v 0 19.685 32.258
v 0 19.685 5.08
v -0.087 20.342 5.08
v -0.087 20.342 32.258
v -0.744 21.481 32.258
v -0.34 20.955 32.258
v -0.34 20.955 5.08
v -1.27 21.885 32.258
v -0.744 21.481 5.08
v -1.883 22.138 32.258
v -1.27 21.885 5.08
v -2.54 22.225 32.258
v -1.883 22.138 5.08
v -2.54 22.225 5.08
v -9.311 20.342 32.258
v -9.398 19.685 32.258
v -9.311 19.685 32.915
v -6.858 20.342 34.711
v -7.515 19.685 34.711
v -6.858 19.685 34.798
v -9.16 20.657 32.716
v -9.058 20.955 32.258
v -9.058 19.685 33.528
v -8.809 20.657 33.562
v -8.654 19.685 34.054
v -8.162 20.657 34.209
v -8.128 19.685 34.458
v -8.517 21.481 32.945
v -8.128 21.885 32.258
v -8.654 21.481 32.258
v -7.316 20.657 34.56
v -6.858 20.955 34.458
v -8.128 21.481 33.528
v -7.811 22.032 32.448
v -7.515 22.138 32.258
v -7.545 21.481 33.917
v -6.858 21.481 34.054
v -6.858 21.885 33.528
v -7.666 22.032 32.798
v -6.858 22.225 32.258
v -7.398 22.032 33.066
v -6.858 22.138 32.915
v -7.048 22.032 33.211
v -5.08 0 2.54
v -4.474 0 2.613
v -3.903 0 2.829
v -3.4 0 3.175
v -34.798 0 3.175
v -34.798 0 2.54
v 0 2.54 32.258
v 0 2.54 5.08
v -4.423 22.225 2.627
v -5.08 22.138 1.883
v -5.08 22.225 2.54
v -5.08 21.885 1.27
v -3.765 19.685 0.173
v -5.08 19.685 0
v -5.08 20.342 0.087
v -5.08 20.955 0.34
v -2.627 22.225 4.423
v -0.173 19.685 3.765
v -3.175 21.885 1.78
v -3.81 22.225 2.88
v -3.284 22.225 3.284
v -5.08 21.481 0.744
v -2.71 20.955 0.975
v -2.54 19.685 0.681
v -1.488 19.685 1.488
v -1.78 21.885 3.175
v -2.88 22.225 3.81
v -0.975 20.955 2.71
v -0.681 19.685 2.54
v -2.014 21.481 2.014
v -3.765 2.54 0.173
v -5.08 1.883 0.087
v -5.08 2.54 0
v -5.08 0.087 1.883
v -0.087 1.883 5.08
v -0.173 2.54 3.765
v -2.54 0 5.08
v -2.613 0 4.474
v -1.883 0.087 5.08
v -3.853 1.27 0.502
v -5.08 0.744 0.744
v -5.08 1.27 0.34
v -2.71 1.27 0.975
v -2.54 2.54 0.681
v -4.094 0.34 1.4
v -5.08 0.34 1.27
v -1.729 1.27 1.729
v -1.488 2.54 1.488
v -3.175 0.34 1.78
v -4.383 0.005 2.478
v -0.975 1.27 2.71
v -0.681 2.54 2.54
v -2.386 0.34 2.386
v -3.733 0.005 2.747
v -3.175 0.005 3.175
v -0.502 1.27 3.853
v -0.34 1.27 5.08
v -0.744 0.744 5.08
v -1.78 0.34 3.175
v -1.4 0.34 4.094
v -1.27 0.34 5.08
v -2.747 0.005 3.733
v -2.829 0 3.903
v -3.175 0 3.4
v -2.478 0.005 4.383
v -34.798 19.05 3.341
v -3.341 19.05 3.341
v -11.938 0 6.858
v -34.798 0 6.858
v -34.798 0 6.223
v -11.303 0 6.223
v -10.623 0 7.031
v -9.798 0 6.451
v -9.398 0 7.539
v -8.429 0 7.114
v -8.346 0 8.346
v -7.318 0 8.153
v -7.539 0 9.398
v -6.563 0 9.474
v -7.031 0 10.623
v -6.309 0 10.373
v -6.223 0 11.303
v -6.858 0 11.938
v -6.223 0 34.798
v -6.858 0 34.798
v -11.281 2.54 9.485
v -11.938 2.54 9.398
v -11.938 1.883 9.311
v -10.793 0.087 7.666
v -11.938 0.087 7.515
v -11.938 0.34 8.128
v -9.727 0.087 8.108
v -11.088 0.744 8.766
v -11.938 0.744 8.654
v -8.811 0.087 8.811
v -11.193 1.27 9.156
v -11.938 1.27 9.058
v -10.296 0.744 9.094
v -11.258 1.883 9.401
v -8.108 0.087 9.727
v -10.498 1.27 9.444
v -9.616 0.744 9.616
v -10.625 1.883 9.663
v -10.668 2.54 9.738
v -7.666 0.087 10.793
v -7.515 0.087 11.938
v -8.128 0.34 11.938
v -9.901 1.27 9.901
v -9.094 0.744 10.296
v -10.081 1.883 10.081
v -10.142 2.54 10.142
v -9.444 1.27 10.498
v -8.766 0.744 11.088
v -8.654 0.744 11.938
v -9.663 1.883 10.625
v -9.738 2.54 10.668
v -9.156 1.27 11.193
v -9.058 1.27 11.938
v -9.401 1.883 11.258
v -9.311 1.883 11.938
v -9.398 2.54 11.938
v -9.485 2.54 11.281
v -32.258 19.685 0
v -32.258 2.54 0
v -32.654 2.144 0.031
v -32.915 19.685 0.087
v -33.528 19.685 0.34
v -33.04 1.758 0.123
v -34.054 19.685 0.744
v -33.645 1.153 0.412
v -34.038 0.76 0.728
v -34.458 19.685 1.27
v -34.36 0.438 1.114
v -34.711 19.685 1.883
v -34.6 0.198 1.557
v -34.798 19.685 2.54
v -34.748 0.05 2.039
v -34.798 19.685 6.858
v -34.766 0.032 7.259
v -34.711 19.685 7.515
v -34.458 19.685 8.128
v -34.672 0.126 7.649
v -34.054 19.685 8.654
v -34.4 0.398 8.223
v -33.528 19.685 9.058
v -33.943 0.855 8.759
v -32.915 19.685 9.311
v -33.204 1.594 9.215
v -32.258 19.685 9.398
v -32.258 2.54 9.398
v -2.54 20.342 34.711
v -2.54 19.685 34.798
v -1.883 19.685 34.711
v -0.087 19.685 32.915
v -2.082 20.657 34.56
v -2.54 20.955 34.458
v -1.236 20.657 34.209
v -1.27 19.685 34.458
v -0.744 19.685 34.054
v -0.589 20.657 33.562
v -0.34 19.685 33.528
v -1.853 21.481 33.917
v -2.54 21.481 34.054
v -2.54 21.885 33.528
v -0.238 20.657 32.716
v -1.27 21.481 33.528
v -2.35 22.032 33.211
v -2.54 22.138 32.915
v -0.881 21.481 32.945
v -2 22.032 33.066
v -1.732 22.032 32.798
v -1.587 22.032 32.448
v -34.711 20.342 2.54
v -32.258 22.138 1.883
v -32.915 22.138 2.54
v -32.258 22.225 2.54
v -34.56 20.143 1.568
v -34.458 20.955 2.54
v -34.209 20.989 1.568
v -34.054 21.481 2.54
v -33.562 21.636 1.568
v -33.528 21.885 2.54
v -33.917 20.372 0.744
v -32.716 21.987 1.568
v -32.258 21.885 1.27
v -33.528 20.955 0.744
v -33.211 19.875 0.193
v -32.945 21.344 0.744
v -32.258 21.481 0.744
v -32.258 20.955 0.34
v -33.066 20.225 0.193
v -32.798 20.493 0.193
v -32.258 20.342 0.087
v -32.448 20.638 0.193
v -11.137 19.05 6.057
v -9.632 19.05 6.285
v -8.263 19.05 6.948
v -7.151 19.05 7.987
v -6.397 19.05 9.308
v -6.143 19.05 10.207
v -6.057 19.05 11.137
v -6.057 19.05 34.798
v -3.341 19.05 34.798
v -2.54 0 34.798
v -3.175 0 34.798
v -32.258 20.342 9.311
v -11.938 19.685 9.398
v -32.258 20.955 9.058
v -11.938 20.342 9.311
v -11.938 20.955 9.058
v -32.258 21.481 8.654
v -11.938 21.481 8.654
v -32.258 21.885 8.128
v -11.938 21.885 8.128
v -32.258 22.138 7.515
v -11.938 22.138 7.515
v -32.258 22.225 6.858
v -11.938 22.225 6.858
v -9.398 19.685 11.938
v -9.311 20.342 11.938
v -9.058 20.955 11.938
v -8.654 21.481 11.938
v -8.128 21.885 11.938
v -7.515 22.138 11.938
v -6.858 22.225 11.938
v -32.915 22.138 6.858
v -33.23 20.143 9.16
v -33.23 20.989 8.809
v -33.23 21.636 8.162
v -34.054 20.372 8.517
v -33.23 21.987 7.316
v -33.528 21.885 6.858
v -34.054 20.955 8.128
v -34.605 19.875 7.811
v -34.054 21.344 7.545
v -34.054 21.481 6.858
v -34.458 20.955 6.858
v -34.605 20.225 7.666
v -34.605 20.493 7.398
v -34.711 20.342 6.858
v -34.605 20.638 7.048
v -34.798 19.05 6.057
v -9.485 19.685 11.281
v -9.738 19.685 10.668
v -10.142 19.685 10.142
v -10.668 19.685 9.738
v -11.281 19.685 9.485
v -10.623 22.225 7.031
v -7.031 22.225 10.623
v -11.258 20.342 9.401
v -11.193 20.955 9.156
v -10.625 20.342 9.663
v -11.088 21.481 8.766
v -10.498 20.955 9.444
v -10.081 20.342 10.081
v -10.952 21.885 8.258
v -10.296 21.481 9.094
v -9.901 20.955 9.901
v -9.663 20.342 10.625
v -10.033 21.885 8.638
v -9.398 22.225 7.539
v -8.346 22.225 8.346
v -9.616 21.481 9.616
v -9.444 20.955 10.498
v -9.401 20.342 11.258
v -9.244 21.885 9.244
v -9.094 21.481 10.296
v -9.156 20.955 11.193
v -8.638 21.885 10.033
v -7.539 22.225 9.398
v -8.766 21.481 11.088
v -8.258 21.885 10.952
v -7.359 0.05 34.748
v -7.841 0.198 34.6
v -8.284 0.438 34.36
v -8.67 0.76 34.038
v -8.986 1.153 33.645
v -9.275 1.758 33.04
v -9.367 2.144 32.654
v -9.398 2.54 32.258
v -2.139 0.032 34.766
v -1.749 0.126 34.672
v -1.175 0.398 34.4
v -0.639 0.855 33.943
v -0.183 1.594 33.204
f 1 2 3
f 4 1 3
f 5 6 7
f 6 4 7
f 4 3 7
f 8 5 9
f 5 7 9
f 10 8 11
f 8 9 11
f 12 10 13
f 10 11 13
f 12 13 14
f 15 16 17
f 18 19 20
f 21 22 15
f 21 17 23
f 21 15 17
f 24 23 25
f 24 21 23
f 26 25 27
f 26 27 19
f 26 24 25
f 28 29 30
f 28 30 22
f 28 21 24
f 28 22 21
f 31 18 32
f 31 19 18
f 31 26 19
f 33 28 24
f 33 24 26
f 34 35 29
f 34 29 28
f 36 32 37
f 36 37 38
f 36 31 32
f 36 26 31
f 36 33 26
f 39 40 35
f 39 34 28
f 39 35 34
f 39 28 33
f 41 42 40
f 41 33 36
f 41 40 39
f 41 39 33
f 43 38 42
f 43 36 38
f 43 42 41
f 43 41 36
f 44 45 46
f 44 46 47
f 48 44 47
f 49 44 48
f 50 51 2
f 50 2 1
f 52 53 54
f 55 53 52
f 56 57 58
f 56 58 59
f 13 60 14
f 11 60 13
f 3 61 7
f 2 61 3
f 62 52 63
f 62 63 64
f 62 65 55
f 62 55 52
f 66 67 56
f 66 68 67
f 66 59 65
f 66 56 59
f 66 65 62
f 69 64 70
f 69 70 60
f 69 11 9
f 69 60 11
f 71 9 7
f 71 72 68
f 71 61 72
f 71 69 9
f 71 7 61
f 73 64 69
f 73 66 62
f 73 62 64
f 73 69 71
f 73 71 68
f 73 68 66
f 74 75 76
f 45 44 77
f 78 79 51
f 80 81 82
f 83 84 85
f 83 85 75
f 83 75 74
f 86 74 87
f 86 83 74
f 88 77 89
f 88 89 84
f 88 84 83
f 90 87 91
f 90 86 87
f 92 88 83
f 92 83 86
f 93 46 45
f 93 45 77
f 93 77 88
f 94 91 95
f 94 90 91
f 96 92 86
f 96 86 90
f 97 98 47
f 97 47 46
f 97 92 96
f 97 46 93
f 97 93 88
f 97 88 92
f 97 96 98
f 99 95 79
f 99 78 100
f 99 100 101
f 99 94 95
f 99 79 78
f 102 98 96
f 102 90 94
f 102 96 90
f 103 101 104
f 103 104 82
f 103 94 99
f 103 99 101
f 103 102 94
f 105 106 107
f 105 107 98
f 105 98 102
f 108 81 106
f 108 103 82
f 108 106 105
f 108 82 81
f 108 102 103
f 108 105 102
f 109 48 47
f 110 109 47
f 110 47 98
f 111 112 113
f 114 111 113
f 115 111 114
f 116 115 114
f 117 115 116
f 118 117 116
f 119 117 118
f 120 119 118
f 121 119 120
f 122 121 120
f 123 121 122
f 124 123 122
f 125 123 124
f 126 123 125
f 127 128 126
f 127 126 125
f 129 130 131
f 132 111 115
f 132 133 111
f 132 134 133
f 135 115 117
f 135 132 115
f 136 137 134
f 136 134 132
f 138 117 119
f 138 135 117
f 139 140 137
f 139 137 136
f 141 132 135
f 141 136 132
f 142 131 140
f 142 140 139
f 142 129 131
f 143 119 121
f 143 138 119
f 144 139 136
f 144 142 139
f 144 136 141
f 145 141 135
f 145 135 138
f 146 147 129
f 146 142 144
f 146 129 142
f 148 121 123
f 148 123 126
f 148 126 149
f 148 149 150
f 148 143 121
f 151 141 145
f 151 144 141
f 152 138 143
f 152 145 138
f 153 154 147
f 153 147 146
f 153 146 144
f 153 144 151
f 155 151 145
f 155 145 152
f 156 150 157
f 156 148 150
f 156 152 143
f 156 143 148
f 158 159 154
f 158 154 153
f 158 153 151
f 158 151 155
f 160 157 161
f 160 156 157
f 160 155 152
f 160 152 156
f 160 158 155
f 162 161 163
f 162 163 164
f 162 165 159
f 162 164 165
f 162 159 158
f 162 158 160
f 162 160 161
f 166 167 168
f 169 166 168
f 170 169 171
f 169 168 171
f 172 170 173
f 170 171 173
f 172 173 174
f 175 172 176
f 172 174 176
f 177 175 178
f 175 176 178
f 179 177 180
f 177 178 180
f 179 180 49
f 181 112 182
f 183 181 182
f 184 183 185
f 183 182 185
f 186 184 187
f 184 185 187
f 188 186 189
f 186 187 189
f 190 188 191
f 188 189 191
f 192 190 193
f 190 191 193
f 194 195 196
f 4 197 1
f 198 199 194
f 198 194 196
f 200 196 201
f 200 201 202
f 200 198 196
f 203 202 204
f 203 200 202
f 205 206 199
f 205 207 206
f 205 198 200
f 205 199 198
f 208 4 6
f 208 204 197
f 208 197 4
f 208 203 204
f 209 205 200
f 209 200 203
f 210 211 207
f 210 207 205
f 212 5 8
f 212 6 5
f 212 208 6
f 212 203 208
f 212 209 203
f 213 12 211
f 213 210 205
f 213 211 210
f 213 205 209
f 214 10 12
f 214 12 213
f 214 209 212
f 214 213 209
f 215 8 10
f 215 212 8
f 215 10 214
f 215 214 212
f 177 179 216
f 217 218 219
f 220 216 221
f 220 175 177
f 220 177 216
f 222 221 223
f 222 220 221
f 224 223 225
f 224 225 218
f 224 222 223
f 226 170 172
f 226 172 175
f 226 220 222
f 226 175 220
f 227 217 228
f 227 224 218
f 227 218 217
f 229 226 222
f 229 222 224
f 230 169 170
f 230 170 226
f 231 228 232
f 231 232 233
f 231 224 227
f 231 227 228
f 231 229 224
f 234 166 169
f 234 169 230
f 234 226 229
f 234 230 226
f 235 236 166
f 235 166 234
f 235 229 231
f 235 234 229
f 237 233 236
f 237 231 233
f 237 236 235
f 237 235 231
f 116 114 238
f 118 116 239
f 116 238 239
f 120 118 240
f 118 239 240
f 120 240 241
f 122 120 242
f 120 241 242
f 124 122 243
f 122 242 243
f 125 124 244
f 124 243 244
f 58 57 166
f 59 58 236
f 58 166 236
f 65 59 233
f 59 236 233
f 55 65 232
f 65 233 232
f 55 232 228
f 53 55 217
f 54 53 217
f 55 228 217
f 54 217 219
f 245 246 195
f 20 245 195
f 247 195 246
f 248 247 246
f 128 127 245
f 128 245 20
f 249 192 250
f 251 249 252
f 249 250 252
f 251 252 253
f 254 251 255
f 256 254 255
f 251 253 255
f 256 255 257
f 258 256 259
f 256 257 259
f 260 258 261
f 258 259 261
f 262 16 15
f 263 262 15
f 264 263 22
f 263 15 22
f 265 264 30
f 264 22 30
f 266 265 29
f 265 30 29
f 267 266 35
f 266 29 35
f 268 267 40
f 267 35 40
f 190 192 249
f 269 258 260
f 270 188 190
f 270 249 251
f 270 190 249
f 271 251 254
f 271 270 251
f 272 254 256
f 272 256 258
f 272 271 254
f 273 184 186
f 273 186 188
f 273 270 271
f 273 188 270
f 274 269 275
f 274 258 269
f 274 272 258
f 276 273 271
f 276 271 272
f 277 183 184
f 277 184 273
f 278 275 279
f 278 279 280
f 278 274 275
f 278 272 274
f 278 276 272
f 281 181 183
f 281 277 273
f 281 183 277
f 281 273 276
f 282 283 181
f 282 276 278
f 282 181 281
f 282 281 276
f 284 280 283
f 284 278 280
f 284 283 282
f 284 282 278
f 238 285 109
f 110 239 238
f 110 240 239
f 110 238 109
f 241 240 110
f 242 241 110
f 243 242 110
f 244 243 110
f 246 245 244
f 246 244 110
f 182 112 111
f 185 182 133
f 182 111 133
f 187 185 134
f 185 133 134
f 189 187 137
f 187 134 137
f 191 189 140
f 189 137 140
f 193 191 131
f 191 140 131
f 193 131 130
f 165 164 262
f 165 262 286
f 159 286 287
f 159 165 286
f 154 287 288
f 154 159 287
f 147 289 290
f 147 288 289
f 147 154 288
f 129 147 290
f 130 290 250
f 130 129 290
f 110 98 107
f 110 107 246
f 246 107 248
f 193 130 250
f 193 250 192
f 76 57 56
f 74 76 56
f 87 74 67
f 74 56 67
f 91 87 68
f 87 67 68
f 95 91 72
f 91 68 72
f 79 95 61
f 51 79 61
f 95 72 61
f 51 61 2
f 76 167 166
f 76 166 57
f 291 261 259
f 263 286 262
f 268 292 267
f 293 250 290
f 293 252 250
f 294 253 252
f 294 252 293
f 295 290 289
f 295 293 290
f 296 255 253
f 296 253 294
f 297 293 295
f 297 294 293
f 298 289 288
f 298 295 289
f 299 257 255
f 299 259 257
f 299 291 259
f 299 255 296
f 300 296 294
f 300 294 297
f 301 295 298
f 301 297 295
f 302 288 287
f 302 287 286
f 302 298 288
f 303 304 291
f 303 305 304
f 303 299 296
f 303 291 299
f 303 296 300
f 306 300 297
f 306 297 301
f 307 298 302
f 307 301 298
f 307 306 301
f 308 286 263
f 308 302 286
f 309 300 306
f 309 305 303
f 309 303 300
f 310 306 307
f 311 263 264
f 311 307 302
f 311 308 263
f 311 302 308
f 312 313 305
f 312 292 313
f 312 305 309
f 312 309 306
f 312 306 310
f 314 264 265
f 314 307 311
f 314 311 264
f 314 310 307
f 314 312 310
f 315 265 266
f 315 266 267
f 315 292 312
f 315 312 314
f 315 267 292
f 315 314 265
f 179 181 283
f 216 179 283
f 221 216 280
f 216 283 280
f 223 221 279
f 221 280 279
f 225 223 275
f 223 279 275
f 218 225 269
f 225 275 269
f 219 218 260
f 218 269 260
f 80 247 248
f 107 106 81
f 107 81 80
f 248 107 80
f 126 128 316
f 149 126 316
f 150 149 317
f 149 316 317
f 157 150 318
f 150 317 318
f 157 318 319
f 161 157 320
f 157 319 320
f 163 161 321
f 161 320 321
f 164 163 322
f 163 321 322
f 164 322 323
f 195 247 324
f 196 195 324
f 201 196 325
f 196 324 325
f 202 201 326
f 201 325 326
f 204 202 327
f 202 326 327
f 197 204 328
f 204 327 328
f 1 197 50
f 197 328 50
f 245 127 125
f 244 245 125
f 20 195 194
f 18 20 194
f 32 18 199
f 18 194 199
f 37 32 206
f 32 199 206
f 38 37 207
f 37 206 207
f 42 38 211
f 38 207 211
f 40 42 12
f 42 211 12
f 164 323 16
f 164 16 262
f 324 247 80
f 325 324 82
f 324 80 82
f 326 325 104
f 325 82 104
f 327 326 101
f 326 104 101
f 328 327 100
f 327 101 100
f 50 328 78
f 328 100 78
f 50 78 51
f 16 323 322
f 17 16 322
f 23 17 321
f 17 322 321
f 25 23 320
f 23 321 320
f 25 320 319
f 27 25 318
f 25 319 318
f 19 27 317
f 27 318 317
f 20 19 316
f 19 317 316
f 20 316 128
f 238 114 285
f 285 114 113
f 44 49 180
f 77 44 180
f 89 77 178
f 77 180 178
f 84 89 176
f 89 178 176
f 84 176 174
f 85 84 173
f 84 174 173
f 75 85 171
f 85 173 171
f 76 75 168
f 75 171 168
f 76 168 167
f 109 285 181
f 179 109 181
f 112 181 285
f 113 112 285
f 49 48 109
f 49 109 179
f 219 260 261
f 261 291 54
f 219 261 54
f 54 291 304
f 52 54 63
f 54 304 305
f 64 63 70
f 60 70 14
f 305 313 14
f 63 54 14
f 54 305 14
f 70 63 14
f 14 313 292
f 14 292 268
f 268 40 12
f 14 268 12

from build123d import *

# Parameters (mm, degrees)
BOSS_EXTRUDE1_DEPTH = 22.225
CUT_EXTRUDE1_DEPTH  = 19.05
CUT_EXTRUDE1_DRAFT  = -0.5
FILLET1_R           = 5.08
FILLET2_R           = 2.54


with BuildPart() as part:
    # Sketch1 → Boss-Extrude1 (new body)
    with BuildSketch(Plane(origin=(0, 0, 0), x_dir=(1, 0, 0), z_dir=(0, 1, 0))):
        Polygon((-34.798, 0), (0, 0), (0, -34.798), (-9.398, -34.798), (-9.398, -9.398), (-34.798, -9.398), align=None)
    extrude(amount=BOSS_EXTRUDE1_DEPTH)


with BuildPart() as cut_extrude1_tool:
    # Sketch2 → Cut-Extrude1 (with draft: the straight prism first)
    with BuildSketch(Plane.XZ):
        Polygon((-3.175, 40.346025657), (-6.223, 40.346025657), (-6.223, 6.223), (-37.911790098, 6.223), (-37.911790098, 3.175), (-3.175, 3.175), align=None)
    extrude(amount=-CUT_EXTRUDE1_DEPTH)
    # Cut-Extrude1: the draft: its side faces are tilted about the plane it starts from
    cut_extrude1_sides = [cut_extrude1_tool.faces().sort_by_distance(p)[0] for p in [
        (-4.699, 9.525, 40.346025657),
        (-6.223, 9.525, 23.284512829),
        (-22.067395049, 9.525, 6.223),
        (-37.911790098, 9.525, 4.699),
        (-20.543395049, 9.525, 3.175),
        (-3.175, 9.525, 21.760512829),
    ]]
    draft(cut_extrude1_sides, Plane.XZ, CUT_EXTRUDE1_DRAFT)


with BuildPart() as part_1:
    add(part.part)

    # Cut-Extrude1: cut by cut_extrude1_tool
    add(cut_extrude1_tool.part, mode=Mode.SUBTRACT)

    # Fillet1
    fillet1_edges = [part_1.edges().sort_by_distance(p)[0] for p in [
        (0, 11.1125, 0),
        (-6.139876584, 9.525, 6.139876584),
    ]]
    fillet(fillet1_edges, radius=FILLET1_R)

    # Fillet2
    # the kernel refuses this fillet: 2.54 mm, written as the material it adds along each edge
    with BuildSketch(Plane(origin=(-9.398, 0, 9.398), x_dir=(-1, 0, 0), z_dir=(0, 1, 0))) as fillet2_piece_1:
        with BuildLine():
            CenterArc((FILLET2_R, FILLET2_R), FILLET2_R, 180, 90)
            Line((0, FILLET2_R), (0, 0))
            Line((0, 0), (FILLET2_R, 0))
        make_face()
    extrude(amount=22.225)
    # the kernel refuses this fillet: 2.54 mm, written as the material it takes off along each edge
    with BuildSketch(Plane(origin=(-32.258, 19.685, 2.54), x_dir=(-1, 0, 0), z_dir=(0, 0, -1))) as fillet2_2_piece_1_section:
        Polygon((0, 0), (FILLET2_R, 0), (FILLET2_R, FILLET2_R), (0, FILLET2_R), align=None)
    fillet2_2_piece_1 = extrude(amount=FILLET2_R, mode=Mode.PRIVATE)
    fillet2_2_piece_1 = fillet2_2_piece_1 - Plane(origin=(-32.258, 19.685, 2.54), x_dir=(0.7071067811865475, -0.7071067811865475, 0), z_dir=(0, 0, -1)) * Sphere(FILLET2_R, mode=Mode.PRIVATE)
    add(fillet2_2_piece_1, mode=Mode.SUBTRACT)
    with BuildSketch(Plane(origin=(-2.54, 19.685, 32.258), x_dir=(1, 0, 0), z_dir=(0, 1, 0))) as fillet2_2_piece_2_section:
        Polygon((0, 0), (FILLET2_R, 0), (FILLET2_R, -FILLET2_R), (0, -FILLET2_R), align=None)
    fillet2_2_piece_2 = extrude(amount=FILLET2_R, mode=Mode.PRIVATE)
    fillet2_2_piece_2 = fillet2_2_piece_2 - Plane(origin=(-2.54, 19.685, 32.258), x_dir=(-0.7071067811865478, 0, -0.7071067811865471), z_dir=(0, 1, 0)) * Sphere(FILLET2_R, mode=Mode.PRIVATE)
    add(fillet2_2_piece_2, mode=Mode.SUBTRACT)
    with BuildSketch(Plane(origin=(-6.858, 19.685, 32.258), x_dir=(-1, 0, 0), z_dir=(0, 1, 0))) as fillet2_2_piece_3_section:
        Polygon((0, 0), (FILLET2_R, 0), (FILLET2_R, FILLET2_R), (0, FILLET2_R), align=None)
    fillet2_2_piece_3 = extrude(amount=FILLET2_R, mode=Mode.PRIVATE)
    fillet2_2_piece_3 = fillet2_2_piece_3 - Plane(origin=(-6.858, 19.685, 32.258), x_dir=(0.7071067811865471, 0, -0.7071067811865479), z_dir=(0, 1, 0)) * Sphere(FILLET2_R, mode=Mode.PRIVATE)
    add(fillet2_2_piece_3, mode=Mode.SUBTRACT)
    with BuildSketch(Plane(origin=(-32.258, 19.685, 6.858), x_dir=(0, 0, 1), z_dir=(-1, 0, 0))) as fillet2_2_piece_4_section:
        Polygon((0, 0), (FILLET2_R, 0), (FILLET2_R, FILLET2_R), (0, FILLET2_R), align=None)
    fillet2_2_piece_4 = extrude(amount=FILLET2_R, mode=Mode.PRIVATE)
    fillet2_2_piece_4 = fillet2_2_piece_4 - Plane(origin=(-32.258, 19.685, 6.858), x_dir=(0, -0.7071067811865475, -0.7071067811865475), z_dir=(-1, 0, 0)) * Sphere(FILLET2_R, mode=Mode.PRIVATE)
    add(fillet2_2_piece_4, mode=Mode.SUBTRACT)
    with BuildSketch(Plane(origin=(-34.798, -6.35, 0), x_dir=(1, 0, 0), z_dir=(0, 1, 0)), Plane(origin=(-34.798, -6.35, 9.398), x_dir=(0, 0, -1), z_dir=(0, 1, 0))) as fillet2_2_piece_5:
        with BuildLine():
            CenterArc((FILLET2_R, -FILLET2_R), FILLET2_R, 90, 90)
            Line((0, -FILLET2_R), (0, 0))
            Line((0, 0), (FILLET2_R, 0))
        make_face()
    extrude(amount=26.035, mode=Mode.SUBTRACT)
    with BuildSketch(Plane(origin=(0, -6.35, 34.798), x_dir=(0, 0, -1), z_dir=(0, 1, 0)), Plane(origin=(-9.398, -6.35, 34.798), x_dir=(1, 0, 0), z_dir=(0, 1, 0))) as fillet2_2_piece_6:
        with BuildLine():
            CenterArc((FILLET2_R, FILLET2_R), FILLET2_R, 180, 90)
            Line((0, FILLET2_R), (0, 0))
            Line((0, 0), (FILLET2_R, 0))
        make_face()
    extrude(amount=26.035, mode=Mode.SUBTRACT)
    with BuildSketch(Plane(origin=(-9.398, 22.225, 32.258), x_dir=(1, 0, 0), z_dir=(0, 0, -1)), Plane(origin=(-11.938, 22.225, 9.398), x_dir=(0, 0, -1), z_dir=(-1, 0, 0))) as fillet2_2_piece_7:
        with BuildLine():
            CenterArc((FILLET2_R, FILLET2_R), FILLET2_R, 180, 90)
            Line((0, FILLET2_R), (0, 0))
            Line((0, 0), (FILLET2_R, 0))
        make_face()
    extrude(amount=20.32, mode=Mode.SUBTRACT)
    with BuildSketch(Plane(origin=(-2.54, 22.225, 34.798), x_dir=(0, 0, -1), z_dir=(-1, 0, 0))) as fillet2_2_piece_8:
        with BuildLine():
            CenterArc((FILLET2_R, FILLET2_R), FILLET2_R, 180, 90)
            Line((0, FILLET2_R), (0, 0))
            Line((0, 0), (FILLET2_R, 0))
        make_face()
    extrude(amount=4.318, mode=Mode.SUBTRACT)
    with BuildSketch(Plane(origin=(0, 22.225, 5.08), x_dir=(-1, 0, 0), z_dir=(0, 0, 1))) as fillet2_2_piece_9:
        with BuildLine():
            CenterArc((FILLET2_R, FILLET2_R), FILLET2_R, 180, 90)
            Line((0, FILLET2_R), (0, 0))
            Line((0, 0), (FILLET2_R, 0))
        make_face()
    extrude(amount=27.178, mode=Mode.SUBTRACT)
    with BuildSketch(Plane(origin=(-41.148, 0, 0), x_dir=(0, 1, 0), z_dir=(1, 0, 0))) as fillet2_2_piece_10:
        with BuildLine():
            CenterArc((FILLET2_R, FILLET2_R), FILLET2_R, 180, 90)
            Line((0, FILLET2_R), (0, 0))
            Line((0, 0), (FILLET2_R, 0))
        make_face()
    extrude(amount=36.068, mode=Mode.SUBTRACT)
    with BuildSketch(Plane(origin=(-32.258, 22.225, 0), x_dir=(0, -1, 0), z_dir=(1, 0, 0))) as fillet2_2_piece_11:
        with BuildLine():
            CenterArc((FILLET2_R, -FILLET2_R), FILLET2_R, 90, 90)
            Line((0, -FILLET2_R), (0, 0))
            Line((0, 0), (FILLET2_R, 0))
        make_face()
    extrude(amount=27.178, mode=Mode.SUBTRACT)
    with BuildSketch(Plane(origin=(-34.798, 22.225, 6.858), x_dir=(0, -1, 0), z_dir=(0, 0, -1))) as fillet2_2_piece_12:
        with BuildLine():
            CenterArc((FILLET2_R, -FILLET2_R), FILLET2_R, 90, 90)
            Line((0, -FILLET2_R), (0, 0))
            Line((0, 0), (FILLET2_R, 0))
        make_face()
    extrude(amount=4.318, mode=Mode.SUBTRACT)
    with BuildSketch(Plane(origin=(-5.08, 0, 5.08), x_dir=(0, 0, -1), z_dir=(-1, 0, 0))) as fillet2_2_piece_13:
        with BuildLine():
            CenterArc((5.08 - FILLET2_R, -FILLET2_R), FILLET2_R, 0, 90)
            Line((5.08, -FILLET2_R), (5.08, 0))
            Line((5.08, 0), (5.08 - FILLET2_R, 0))
        make_face()
    revolve(axis=Axis((-5.08, 0, 5.08), (0, -1, 0)), revolution_arc=90, mode=Mode.SUBTRACT)
    with BuildSketch(Plane(origin=(-5.08, 22.225, 5.08), x_dir=(0, 0, -1), z_dir=(-1, 0, 0))) as fillet2_2_piece_14:
        with BuildLine():
            CenterArc((5.08 - FILLET2_R, FILLET2_R), FILLET2_R, 270, 90)
            Line((5.08 - FILLET2_R, 0), (5.08, 0))
            Line((5.08, 0), (5.08, FILLET2_R))
        make_face()
    revolve(axis=Axis((-5.08, 22.225, 5.08), (0, -1, 0)), revolution_arc=90, mode=Mode.SUBTRACT)
    with BuildSketch(Plane(origin=(0, 0, 5.08), x_dir=(-1, 0, 0), z_dir=(0, 0, 1))) as fillet2_2_piece_15:
        with BuildLine():
            CenterArc((FILLET2_R, -FILLET2_R), FILLET2_R, 90, 90)
            Line((0, -FILLET2_R), (0, 0))
            Line((0, 0), (FILLET2_R, 0))
        make_face()
    extrude(amount=36.068, mode=Mode.SUBTRACT)
    with BuildSketch(Plane(origin=(-9.398, 0, 41.148), x_dir=(1, 0, 0), z_dir=(0, 0, -1)), Plane(origin=(-11.938, 0, 9.398), x_dir=(0, 0, -1), z_dir=(-1, 0, 0))) as fillet2_2_piece_16:
        with BuildLine():
            CenterArc((FILLET2_R, -FILLET2_R), FILLET2_R, 90, 90)
            Line((0, -FILLET2_R), (0, 0))
            Line((0, 0), (FILLET2_R, 0))
        make_face()
    extrude(amount=29.21, mode=Mode.SUBTRACT)
    with BuildSketch(Plane(origin=(-11.938, 22.225, 11.938), x_dir=(0, 0, -1), z_dir=(-1, 0, 0))) as fillet2_2_piece_17:
        with BuildLine():
            CenterArc((2.54 + FILLET2_R, FILLET2_R), FILLET2_R, 180, 90)
            Line((2.54, FILLET2_R), (2.54, 0))
            Line((2.54, 0), (2.54 + FILLET2_R, 0))
        make_face()
    revolve(axis=Axis((-11.938, 22.225, 11.938), (0, -1, 0)), revolution_arc=90, mode=Mode.SUBTRACT)
    with BuildSketch(Plane(origin=(-11.938, 0, 11.938), x_dir=(0, 0, -1), z_dir=(-1, 0, 0))) as fillet2_2_piece_18:
        with BuildLine():
            CenterArc((2.54 + FILLET2_R, -FILLET2_R), FILLET2_R, 90, 90)
            Line((2.54, -FILLET2_R), (2.54, 0))
            Line((2.54, 0), (2.54 + FILLET2_R, 0))
        make_face()
    revolve(axis=Axis((-11.938, 0, 11.938), (0, -1, 0)), revolution_arc=90, mode=Mode.SUBTRACT)


solid = part_1.part
